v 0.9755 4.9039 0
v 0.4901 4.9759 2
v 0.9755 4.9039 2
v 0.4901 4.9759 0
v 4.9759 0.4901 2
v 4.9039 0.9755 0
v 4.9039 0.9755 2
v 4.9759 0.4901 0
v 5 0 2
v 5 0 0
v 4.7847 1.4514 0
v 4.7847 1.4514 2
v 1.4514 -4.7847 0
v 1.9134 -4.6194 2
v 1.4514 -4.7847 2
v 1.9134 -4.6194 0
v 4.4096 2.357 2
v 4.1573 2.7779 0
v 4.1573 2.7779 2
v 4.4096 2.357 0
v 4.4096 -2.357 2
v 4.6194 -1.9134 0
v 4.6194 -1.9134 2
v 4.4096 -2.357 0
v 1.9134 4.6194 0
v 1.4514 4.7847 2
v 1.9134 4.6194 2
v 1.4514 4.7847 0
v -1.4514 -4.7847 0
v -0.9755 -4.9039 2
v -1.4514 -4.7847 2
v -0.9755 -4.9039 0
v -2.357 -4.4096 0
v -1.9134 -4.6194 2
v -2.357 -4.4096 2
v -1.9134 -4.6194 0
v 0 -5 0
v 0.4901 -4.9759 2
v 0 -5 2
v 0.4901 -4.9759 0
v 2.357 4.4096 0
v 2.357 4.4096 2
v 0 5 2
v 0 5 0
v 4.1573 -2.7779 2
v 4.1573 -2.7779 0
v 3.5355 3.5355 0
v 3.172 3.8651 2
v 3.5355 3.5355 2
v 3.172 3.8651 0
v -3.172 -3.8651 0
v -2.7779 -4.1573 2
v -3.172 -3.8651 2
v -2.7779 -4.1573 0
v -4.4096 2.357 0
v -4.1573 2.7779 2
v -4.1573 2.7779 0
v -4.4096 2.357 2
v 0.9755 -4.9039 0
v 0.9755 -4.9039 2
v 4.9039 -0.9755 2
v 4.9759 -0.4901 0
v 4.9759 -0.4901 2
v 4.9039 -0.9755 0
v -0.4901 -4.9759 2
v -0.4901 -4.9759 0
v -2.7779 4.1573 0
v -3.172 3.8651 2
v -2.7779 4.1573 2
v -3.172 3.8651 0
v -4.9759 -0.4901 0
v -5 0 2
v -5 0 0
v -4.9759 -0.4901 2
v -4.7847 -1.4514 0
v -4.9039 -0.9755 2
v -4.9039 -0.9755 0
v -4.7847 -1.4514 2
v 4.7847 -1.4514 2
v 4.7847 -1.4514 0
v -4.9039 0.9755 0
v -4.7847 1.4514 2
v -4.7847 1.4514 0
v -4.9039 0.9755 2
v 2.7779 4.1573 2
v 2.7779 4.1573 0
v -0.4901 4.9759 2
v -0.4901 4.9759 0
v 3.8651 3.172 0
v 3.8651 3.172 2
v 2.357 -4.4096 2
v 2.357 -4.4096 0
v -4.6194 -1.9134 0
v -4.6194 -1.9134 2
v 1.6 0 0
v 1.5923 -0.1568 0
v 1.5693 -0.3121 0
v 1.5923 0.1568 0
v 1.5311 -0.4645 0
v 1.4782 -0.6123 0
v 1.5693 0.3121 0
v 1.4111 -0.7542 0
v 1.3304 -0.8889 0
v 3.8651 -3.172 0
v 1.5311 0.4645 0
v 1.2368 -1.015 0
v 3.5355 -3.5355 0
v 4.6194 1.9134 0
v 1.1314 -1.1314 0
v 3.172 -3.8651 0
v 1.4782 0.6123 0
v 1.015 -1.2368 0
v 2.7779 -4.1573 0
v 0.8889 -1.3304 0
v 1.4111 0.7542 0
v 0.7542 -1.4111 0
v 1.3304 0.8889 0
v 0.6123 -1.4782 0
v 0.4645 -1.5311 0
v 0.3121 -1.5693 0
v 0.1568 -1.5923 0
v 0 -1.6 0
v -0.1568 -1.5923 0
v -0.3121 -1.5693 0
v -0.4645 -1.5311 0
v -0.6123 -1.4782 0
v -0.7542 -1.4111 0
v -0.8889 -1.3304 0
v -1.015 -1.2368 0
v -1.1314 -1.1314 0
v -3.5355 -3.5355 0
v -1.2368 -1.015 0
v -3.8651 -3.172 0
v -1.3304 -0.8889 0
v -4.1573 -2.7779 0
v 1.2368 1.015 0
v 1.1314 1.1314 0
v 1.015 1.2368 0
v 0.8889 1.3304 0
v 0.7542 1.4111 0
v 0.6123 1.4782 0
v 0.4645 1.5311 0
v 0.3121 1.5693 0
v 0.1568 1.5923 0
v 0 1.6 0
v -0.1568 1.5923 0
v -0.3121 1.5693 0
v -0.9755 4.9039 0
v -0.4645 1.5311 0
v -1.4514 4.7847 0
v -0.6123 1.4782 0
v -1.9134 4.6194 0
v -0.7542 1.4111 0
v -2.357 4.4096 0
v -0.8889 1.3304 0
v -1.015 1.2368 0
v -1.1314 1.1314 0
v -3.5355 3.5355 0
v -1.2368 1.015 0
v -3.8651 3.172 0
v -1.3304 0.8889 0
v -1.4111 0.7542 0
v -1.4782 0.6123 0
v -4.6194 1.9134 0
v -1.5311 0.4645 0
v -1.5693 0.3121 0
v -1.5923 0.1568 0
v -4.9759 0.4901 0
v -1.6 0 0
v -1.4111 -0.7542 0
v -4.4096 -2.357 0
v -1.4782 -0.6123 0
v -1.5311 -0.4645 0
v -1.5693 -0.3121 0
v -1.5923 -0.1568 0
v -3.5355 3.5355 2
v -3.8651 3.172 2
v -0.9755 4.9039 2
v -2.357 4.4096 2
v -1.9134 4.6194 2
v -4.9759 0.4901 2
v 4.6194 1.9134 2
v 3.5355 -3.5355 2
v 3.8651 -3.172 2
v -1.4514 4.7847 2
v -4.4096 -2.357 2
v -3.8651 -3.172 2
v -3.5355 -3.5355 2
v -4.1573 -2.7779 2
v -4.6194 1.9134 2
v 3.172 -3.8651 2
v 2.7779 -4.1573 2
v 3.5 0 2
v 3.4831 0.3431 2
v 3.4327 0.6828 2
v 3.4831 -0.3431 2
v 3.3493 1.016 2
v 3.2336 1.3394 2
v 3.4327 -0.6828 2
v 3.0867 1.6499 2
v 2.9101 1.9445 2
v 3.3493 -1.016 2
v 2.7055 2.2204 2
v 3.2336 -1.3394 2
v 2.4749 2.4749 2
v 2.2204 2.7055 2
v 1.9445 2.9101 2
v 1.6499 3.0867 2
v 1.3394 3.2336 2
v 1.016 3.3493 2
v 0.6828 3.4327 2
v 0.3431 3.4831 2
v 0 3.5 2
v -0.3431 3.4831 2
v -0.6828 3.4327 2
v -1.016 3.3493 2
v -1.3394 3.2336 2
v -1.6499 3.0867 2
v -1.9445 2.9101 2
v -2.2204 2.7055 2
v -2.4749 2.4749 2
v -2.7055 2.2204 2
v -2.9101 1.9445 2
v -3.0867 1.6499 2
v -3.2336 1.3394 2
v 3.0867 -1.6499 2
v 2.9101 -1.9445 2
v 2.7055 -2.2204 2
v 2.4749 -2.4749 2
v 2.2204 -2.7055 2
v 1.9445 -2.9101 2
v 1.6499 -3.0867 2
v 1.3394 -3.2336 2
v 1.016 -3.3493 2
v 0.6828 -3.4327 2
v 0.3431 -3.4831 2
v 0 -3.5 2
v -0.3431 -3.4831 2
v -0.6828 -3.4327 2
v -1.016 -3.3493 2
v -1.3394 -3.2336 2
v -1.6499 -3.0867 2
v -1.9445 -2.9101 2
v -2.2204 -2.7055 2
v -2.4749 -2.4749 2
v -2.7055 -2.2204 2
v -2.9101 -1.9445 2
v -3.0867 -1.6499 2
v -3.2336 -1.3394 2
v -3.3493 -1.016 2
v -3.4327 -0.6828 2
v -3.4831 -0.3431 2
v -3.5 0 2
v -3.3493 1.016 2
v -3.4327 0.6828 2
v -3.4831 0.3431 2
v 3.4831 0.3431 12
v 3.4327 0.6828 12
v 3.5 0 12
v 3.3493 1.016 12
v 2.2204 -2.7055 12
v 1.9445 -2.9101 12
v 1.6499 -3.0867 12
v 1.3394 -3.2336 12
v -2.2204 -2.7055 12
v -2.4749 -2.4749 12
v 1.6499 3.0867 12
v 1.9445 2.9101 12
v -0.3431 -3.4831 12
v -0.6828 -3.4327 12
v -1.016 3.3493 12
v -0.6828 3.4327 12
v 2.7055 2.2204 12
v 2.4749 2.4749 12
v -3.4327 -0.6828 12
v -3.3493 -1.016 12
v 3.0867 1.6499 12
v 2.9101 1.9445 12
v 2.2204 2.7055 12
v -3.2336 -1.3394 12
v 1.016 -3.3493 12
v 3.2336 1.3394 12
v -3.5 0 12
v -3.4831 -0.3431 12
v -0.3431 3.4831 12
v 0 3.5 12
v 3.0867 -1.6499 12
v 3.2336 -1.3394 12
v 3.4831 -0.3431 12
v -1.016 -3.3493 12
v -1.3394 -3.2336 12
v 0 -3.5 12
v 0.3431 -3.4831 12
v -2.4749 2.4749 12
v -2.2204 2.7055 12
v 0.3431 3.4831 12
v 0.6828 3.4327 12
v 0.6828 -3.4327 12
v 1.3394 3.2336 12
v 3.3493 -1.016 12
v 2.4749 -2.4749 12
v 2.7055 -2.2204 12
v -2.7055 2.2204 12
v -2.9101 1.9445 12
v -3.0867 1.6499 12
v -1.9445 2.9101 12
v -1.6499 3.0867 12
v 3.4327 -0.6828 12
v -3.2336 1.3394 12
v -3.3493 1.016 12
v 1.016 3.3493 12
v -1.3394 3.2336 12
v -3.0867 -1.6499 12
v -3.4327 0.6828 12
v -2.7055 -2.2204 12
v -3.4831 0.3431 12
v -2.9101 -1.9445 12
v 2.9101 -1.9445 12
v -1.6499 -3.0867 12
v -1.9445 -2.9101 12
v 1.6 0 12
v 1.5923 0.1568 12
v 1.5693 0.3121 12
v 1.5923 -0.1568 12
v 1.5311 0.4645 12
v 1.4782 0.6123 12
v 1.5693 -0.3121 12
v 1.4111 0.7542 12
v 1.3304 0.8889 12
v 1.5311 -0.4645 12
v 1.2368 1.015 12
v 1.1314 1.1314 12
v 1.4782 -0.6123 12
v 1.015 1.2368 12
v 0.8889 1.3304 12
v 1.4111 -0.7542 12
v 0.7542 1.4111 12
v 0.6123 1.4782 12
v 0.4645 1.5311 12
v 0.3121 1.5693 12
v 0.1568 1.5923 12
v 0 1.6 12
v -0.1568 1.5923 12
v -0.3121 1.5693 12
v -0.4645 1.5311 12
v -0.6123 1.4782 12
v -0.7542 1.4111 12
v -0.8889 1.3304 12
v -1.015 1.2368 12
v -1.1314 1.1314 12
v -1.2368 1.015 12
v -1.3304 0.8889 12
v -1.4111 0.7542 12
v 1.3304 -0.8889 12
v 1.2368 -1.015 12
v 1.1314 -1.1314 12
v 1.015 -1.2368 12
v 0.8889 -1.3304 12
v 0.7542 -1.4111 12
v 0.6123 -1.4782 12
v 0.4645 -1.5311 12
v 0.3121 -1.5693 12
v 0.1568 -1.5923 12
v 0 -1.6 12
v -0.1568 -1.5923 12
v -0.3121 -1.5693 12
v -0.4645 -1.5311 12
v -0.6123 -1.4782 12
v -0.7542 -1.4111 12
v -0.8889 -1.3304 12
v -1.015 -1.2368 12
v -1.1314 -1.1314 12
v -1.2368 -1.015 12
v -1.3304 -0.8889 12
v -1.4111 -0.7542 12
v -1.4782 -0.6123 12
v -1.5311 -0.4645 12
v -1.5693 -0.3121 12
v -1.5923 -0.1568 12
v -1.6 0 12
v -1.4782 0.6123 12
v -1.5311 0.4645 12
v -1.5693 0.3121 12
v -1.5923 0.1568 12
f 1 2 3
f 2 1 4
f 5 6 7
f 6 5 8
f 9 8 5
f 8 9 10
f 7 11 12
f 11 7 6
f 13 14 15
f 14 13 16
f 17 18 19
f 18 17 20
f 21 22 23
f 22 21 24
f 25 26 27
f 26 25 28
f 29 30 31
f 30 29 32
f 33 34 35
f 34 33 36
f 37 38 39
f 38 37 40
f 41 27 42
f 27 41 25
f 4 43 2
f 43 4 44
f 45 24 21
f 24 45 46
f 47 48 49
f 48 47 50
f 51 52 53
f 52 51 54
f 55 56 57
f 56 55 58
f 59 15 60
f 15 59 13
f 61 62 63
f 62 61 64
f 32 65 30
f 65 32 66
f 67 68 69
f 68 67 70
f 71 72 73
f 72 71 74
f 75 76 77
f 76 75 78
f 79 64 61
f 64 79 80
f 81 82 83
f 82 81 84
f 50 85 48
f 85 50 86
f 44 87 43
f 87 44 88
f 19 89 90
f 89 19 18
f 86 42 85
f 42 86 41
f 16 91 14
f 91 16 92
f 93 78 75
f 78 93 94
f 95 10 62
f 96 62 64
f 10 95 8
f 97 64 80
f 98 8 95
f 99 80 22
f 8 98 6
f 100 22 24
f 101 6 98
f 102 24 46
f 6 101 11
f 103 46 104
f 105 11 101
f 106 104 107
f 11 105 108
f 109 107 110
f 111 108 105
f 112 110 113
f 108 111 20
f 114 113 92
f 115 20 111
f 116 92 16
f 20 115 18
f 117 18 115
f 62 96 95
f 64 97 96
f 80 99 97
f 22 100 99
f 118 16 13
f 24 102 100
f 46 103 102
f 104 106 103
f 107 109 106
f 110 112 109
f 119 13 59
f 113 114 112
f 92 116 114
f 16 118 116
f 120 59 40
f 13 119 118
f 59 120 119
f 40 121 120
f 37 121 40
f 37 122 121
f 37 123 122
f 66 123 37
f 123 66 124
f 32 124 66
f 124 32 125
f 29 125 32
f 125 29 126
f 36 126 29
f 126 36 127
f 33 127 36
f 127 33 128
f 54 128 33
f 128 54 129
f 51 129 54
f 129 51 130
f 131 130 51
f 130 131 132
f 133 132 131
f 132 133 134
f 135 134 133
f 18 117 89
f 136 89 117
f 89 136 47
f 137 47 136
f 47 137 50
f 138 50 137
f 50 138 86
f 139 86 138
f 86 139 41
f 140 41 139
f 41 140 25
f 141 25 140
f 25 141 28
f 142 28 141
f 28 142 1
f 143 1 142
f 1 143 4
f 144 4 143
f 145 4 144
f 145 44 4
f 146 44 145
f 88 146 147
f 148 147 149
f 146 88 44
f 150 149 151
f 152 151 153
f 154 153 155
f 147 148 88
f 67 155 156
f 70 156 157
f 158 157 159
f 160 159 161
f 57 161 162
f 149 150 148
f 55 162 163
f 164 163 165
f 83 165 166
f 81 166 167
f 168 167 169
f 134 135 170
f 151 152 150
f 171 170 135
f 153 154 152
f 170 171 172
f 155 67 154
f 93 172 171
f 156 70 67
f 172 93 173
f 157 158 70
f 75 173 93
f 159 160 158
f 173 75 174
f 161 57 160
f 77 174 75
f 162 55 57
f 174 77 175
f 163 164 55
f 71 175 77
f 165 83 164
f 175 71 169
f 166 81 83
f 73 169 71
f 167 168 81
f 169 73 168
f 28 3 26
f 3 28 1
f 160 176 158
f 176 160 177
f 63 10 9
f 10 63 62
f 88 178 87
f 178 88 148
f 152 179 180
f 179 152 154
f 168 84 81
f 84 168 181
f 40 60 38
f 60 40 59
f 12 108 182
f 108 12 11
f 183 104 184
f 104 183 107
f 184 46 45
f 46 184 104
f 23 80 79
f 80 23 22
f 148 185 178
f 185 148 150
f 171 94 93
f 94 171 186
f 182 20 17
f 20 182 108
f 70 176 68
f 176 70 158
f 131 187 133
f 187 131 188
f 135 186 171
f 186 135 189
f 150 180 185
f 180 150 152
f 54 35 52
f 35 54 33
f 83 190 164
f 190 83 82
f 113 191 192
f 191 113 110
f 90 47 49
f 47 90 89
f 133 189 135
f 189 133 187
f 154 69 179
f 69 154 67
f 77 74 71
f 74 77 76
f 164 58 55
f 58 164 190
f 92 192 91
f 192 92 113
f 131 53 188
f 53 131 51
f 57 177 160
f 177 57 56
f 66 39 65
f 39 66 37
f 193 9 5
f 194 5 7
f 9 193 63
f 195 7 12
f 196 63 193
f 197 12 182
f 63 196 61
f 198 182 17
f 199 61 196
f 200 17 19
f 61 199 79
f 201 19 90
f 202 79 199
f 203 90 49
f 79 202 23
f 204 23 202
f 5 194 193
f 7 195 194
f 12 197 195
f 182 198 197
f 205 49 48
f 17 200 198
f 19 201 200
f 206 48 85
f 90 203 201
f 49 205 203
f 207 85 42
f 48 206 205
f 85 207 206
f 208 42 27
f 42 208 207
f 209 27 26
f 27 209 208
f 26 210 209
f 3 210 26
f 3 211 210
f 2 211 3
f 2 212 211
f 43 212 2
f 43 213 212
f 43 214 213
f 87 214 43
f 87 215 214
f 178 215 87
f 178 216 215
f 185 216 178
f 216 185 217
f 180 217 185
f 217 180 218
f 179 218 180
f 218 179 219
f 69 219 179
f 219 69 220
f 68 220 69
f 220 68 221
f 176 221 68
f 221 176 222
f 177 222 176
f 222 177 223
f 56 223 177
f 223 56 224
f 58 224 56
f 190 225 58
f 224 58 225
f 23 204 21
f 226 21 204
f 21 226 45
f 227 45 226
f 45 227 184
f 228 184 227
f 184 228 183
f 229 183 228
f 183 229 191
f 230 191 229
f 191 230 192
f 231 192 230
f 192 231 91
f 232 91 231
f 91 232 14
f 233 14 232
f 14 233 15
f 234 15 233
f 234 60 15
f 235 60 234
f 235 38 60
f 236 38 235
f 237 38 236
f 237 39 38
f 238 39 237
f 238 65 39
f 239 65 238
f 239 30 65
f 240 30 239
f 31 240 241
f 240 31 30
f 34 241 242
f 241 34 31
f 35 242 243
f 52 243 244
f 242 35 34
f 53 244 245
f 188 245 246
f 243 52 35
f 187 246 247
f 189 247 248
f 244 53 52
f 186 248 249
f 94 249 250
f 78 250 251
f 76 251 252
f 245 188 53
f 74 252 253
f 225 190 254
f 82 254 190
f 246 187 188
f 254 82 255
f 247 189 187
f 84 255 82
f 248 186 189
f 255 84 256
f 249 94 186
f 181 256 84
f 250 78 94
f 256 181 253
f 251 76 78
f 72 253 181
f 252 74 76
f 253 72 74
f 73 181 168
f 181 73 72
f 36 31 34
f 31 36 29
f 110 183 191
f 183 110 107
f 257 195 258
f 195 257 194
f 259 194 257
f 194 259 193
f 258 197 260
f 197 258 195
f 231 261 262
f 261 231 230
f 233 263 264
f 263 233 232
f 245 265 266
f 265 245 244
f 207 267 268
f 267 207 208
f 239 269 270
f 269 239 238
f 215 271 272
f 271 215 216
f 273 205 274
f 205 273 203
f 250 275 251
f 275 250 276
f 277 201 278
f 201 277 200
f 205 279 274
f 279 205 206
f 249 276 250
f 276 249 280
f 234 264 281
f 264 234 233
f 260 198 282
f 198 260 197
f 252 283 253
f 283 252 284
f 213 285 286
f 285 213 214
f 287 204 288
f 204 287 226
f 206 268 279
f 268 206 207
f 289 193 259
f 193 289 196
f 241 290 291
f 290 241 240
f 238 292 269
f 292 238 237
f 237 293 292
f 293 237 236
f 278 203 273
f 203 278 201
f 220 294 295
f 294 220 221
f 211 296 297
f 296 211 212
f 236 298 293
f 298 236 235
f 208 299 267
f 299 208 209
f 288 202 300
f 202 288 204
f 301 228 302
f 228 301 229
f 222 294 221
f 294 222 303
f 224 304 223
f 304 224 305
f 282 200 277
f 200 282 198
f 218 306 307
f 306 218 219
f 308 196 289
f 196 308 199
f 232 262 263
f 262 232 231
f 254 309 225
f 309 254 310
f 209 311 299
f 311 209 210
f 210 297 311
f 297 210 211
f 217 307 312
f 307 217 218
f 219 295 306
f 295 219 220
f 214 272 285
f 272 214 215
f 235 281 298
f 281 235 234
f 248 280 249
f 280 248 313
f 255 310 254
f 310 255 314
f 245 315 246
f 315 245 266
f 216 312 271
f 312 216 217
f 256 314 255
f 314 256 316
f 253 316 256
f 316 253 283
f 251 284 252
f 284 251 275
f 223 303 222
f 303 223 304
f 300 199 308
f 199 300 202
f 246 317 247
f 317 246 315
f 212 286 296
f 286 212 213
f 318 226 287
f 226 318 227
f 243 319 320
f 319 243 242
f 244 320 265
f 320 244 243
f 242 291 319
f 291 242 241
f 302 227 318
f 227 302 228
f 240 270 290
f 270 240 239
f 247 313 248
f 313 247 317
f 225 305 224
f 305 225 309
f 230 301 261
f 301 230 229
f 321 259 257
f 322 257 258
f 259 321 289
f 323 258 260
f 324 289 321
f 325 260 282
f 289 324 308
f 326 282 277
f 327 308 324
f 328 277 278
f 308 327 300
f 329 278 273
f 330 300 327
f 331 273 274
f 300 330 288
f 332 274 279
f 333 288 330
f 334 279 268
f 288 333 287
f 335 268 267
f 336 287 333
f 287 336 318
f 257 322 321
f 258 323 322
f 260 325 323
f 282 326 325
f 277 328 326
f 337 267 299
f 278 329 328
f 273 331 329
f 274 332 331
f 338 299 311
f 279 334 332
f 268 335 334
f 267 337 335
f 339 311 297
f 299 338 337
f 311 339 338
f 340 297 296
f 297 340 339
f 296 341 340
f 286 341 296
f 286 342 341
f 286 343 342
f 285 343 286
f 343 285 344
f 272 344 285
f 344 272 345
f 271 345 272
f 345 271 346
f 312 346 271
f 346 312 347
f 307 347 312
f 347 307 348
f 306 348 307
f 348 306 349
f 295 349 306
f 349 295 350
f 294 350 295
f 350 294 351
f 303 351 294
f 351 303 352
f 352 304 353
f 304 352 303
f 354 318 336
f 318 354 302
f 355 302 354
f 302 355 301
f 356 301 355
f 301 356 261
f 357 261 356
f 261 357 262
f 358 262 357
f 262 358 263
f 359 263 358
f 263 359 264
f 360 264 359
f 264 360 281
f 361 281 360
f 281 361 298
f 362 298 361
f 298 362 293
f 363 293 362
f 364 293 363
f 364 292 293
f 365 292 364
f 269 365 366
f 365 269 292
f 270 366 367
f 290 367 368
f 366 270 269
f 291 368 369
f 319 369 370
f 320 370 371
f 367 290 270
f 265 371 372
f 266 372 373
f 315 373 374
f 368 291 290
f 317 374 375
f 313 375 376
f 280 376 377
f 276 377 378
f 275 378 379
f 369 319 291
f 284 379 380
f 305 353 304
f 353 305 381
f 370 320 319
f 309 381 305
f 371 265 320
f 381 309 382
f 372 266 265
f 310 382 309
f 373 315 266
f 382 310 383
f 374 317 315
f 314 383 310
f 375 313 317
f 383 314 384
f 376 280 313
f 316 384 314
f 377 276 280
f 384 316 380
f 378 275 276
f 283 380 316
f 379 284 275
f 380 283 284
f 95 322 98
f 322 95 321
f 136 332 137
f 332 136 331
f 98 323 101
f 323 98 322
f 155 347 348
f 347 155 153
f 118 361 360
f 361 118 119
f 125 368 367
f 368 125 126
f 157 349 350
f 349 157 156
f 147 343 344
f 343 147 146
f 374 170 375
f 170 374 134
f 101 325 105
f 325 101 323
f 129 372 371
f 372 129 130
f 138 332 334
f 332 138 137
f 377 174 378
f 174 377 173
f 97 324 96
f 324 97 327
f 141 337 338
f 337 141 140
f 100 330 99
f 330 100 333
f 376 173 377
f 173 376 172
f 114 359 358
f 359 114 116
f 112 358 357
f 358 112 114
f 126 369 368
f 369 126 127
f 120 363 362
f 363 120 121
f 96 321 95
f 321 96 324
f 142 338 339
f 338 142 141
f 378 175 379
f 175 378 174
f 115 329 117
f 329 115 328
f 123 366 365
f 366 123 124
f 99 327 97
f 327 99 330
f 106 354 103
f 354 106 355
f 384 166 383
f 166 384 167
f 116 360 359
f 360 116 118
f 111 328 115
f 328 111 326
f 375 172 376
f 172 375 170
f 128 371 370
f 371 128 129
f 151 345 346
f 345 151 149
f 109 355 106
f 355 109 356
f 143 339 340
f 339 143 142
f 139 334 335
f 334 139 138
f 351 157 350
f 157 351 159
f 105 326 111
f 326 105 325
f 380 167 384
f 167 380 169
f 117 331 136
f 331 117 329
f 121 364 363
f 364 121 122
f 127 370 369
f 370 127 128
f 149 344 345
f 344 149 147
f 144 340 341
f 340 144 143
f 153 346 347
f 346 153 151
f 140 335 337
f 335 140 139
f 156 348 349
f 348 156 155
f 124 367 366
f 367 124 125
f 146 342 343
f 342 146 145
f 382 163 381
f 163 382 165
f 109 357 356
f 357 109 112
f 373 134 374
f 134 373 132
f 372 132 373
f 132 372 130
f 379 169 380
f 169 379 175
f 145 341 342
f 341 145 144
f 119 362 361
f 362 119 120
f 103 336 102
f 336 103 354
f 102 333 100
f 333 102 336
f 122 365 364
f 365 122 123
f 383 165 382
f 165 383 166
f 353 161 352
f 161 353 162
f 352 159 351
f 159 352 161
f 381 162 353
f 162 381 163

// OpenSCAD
// Generated by printspec 0.1.0
// Review generated CAD before manufacturing.
outer_diameter = 7;
height = 10;
hole_diameter = 3.2;
base_diameter = 10;
base_height = 2;

difference() {
  union() {
    cylinder(h = base_height, d = base_diameter, $fn = 64);
    translate([0, 0, base_height]) cylinder(h = height, d = outer_diameter, $fn = 64);
  }
  translate([0, 0, -0.1]) cylinder(h = base_height + height + 0.2, d = hole_diameter, $fn = 64);
}
